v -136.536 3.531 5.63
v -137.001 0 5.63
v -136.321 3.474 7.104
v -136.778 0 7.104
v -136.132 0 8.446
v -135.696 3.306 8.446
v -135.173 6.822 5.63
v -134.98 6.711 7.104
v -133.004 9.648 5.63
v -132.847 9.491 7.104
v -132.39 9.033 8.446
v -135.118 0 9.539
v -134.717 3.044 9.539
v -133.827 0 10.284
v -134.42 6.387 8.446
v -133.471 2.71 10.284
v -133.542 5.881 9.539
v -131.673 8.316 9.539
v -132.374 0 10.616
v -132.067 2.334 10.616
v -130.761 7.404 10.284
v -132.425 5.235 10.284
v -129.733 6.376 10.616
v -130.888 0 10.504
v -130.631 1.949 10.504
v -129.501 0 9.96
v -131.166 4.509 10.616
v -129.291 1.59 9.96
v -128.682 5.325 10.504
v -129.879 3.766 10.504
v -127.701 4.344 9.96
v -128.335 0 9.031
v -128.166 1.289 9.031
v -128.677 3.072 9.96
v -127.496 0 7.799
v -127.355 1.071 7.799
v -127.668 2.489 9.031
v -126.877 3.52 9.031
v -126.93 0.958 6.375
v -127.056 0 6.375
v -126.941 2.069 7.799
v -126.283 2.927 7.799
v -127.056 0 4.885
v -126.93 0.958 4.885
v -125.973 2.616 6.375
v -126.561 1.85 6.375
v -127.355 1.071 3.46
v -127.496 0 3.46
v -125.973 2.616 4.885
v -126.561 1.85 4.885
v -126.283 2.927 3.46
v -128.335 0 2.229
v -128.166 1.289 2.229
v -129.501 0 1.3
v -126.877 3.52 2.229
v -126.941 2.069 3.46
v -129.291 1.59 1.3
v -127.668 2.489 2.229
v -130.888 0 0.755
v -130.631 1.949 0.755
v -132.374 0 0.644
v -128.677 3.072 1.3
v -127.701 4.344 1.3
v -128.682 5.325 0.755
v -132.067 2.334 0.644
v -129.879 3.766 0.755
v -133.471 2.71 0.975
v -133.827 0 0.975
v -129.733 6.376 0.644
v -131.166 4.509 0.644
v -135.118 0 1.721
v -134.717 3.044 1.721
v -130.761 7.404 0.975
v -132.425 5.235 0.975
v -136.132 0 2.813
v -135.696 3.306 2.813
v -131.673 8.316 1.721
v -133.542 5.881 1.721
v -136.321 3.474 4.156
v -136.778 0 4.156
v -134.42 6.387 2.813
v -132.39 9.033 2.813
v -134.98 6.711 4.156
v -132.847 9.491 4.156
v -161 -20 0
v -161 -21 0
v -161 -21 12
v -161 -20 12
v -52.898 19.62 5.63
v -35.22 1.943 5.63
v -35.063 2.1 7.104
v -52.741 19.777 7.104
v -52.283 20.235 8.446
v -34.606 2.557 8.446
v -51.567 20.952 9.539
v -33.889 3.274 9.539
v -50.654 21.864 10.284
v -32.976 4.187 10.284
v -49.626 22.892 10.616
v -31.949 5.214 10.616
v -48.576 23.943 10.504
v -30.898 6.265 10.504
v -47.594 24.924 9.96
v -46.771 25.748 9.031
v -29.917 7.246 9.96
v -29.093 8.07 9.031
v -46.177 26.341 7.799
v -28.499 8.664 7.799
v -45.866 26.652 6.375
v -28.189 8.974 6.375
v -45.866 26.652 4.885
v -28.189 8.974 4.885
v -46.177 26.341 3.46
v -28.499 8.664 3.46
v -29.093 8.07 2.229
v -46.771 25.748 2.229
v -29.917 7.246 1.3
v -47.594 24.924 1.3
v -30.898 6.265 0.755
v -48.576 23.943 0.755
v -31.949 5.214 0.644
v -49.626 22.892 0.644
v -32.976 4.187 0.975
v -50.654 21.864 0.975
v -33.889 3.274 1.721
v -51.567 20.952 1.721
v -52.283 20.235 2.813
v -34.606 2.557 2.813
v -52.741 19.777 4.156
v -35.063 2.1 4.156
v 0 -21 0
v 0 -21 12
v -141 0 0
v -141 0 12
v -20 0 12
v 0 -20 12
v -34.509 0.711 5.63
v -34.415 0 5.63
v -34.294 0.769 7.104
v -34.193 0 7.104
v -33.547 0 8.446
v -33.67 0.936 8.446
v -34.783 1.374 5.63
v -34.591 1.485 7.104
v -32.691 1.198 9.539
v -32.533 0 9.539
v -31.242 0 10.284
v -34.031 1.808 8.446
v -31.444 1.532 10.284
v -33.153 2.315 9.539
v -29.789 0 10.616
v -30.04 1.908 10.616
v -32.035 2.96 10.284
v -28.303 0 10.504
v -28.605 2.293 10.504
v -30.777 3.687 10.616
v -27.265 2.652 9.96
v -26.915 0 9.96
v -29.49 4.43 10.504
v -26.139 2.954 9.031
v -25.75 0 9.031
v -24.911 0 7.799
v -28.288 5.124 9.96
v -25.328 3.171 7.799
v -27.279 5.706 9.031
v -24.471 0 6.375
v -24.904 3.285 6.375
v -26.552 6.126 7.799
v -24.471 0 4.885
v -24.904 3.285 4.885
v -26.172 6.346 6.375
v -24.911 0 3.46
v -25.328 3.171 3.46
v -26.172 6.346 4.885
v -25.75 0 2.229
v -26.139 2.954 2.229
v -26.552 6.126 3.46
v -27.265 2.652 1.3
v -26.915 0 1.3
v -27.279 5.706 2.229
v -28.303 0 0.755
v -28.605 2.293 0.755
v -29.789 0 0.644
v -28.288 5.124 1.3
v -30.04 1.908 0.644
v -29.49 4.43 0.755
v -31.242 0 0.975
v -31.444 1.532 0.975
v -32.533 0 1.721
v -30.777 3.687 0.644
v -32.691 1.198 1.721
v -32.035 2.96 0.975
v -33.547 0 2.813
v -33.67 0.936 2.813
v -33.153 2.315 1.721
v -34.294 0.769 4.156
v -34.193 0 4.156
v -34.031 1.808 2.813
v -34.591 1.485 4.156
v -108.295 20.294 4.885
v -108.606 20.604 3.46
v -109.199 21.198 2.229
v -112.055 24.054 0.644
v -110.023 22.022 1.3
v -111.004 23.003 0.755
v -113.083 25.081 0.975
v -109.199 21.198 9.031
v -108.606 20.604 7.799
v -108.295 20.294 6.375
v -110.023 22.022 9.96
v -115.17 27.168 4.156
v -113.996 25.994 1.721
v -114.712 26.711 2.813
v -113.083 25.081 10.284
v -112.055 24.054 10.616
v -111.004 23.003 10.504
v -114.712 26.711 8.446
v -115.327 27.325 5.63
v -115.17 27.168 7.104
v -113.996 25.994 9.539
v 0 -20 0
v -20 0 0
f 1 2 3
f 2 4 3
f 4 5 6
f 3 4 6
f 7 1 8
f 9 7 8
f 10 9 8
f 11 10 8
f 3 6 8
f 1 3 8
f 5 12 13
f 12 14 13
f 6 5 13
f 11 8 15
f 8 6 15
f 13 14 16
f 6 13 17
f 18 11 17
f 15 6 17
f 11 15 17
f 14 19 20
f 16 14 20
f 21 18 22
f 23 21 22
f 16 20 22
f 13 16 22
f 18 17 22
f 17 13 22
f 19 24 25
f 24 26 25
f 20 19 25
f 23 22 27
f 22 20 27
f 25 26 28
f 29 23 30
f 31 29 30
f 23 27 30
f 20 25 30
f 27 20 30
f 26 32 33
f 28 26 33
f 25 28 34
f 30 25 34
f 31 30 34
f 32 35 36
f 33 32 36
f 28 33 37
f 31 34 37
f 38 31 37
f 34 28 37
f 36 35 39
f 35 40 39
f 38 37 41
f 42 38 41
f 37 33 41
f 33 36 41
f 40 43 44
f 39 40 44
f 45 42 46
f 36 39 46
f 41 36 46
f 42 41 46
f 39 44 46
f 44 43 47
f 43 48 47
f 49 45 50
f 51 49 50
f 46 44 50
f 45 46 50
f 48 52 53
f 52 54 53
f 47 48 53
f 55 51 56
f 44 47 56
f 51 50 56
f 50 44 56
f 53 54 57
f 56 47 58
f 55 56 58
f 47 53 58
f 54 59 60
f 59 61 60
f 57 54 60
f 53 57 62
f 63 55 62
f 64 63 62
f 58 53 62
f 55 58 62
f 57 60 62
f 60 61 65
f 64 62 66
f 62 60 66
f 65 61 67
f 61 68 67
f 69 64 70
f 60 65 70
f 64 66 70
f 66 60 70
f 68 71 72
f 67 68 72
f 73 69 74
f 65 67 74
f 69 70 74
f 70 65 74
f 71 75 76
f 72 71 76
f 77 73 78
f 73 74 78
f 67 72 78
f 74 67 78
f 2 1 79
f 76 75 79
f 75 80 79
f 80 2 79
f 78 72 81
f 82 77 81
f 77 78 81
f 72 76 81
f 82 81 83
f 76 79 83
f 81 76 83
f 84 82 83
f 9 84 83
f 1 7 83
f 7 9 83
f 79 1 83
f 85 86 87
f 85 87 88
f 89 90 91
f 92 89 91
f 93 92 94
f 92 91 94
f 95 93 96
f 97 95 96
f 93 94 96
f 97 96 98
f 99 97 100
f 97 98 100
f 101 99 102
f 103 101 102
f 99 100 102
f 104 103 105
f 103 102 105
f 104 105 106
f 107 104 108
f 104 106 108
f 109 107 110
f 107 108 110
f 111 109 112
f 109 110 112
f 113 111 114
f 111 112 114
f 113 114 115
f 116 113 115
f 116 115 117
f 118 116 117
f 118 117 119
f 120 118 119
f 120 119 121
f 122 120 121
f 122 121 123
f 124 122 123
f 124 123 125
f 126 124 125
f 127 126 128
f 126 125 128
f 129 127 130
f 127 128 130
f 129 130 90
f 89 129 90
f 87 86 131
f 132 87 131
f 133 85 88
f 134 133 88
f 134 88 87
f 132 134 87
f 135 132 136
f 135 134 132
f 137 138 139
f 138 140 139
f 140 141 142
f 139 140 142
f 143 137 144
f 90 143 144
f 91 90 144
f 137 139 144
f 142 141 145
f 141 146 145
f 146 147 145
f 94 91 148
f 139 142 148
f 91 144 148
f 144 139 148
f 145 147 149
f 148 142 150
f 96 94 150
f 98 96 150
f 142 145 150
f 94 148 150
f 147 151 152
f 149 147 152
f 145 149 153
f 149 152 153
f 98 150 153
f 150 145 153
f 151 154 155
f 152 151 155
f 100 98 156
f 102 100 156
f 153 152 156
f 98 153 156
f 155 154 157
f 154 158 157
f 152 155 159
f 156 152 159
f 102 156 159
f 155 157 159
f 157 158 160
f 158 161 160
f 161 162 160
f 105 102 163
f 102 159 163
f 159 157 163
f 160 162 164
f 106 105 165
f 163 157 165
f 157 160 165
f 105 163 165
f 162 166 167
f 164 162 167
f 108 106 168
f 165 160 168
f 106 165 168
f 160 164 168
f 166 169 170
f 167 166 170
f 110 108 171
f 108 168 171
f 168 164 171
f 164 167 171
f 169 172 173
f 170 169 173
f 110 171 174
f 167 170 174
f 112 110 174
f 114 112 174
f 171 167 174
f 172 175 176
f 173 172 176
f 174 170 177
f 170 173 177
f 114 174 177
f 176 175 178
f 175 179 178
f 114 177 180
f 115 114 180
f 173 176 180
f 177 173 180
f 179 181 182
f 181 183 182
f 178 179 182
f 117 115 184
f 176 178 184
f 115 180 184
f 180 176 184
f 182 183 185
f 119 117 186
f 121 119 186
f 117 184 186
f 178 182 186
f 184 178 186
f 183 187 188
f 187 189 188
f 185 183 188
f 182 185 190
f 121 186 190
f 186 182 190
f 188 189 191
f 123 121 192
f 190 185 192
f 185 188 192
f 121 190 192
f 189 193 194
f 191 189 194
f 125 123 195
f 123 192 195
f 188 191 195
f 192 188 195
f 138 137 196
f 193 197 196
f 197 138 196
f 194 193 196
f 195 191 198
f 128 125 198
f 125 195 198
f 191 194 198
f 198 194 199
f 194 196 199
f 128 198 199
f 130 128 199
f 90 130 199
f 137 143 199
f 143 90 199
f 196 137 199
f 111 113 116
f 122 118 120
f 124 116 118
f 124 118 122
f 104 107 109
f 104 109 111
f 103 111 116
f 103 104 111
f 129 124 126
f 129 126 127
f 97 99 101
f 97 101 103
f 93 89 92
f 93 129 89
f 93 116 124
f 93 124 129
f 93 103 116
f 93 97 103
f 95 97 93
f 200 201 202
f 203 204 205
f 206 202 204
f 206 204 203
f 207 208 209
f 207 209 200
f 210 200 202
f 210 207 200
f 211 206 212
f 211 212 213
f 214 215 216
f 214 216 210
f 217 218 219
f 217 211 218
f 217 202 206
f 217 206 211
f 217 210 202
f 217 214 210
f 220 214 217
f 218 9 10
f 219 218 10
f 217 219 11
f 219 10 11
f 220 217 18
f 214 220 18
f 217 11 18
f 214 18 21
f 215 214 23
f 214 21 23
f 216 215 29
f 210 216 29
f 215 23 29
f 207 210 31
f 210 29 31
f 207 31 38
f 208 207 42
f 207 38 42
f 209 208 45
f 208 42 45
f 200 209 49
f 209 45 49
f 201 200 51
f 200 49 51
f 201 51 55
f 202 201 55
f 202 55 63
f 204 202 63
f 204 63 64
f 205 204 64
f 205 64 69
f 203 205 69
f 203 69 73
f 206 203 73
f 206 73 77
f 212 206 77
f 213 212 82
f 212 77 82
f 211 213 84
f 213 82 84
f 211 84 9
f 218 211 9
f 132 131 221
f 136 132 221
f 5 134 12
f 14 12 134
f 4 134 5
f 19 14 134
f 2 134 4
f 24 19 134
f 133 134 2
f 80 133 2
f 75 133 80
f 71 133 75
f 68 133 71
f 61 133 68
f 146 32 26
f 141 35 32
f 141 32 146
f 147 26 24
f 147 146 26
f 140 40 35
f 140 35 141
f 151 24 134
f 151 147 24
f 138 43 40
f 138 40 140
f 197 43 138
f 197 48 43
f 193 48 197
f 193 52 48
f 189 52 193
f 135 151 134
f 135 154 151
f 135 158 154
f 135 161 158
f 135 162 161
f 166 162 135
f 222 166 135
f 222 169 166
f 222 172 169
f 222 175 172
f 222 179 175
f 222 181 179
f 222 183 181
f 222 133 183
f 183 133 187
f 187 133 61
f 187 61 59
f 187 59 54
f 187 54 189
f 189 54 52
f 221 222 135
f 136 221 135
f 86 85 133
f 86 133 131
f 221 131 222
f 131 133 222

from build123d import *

# Parameters (mm, degrees)
F0_W      = 161
F0_H      = 21
F1_DEPTH  = 12
F2_SIZE   = 20
F3_SIZE   = 20
F5_R      = 5
F6_ANGLE  = 45
F4_R      = 5
F8_ANGLE  = 45
F9_DEPTH  = 25
F10_DEPTH = 25


with BuildPart() as f1:
    # F0 (on Top) → F1 (new body)
    with BuildSketch(Plane.XY):
        with Locations((-80.5, -10.5)):
            Rectangle(F0_W, F0_H)
    extrude(amount=F1_DEPTH)

    # F2
    f2_edges = [f1.edges().sort_by_distance(p)[0] for p in [
        (-161, 0, 6),
    ]]
    chamfer(f2_edges, length=F2_SIZE)

    # F3
    f3_edges = [f1.edges().sort_by_distance(p)[0] for p in [
        (0, 0, 6),
    ]]
    chamfer(f3_edges, length=F3_SIZE)

    # F5 (on face) → F6 (revolve)
    with BuildSketch(Plane(origin=(0, 0, 0), x_dir=(-1, 0, 0), z_dir=(0, 1, 0))):
        with Locations((132.0005953312, 5.6298593991)):
            Circle(F5_R)
    revolve(axis=Axis((-123.356834054, 0, 5.9305), (0, 0, -1)), revolution_arc=F6_ANGLE)

    # F4 (on face) → F8 (revolve)
    with BuildSketch(Plane(origin=(0, 0, 0), x_dir=(-1, 0, 0), z_dir=(0, 1, 0))):
        with Locations((29.4153820723, 5.6298593991)):
            Circle(F4_R)
    revolve(axis=Axis((-37.1628478169, 0, 5.868), (0, 0, 1)), revolution_arc=F8_ANGLE)

    # F9 (add): a face of the model
    f9_faces = [f1.faces().sort_by_distance(p)[0] for p in [
        (-129.4688962681, 6.1120622141, 5.6298593991),
    ]]
    extrude(f9_faces, amount=F9_DEPTH)

    # F10 (add): a face of the model
    f10_faces = [f1.faces().sort_by_distance(p)[0] for p in [
        (-31.6845622519, 5.478285565, 5.6298593991),
    ]]
    extrude(f10_faces, amount=F10_DEPTH)


solid = f1.part
